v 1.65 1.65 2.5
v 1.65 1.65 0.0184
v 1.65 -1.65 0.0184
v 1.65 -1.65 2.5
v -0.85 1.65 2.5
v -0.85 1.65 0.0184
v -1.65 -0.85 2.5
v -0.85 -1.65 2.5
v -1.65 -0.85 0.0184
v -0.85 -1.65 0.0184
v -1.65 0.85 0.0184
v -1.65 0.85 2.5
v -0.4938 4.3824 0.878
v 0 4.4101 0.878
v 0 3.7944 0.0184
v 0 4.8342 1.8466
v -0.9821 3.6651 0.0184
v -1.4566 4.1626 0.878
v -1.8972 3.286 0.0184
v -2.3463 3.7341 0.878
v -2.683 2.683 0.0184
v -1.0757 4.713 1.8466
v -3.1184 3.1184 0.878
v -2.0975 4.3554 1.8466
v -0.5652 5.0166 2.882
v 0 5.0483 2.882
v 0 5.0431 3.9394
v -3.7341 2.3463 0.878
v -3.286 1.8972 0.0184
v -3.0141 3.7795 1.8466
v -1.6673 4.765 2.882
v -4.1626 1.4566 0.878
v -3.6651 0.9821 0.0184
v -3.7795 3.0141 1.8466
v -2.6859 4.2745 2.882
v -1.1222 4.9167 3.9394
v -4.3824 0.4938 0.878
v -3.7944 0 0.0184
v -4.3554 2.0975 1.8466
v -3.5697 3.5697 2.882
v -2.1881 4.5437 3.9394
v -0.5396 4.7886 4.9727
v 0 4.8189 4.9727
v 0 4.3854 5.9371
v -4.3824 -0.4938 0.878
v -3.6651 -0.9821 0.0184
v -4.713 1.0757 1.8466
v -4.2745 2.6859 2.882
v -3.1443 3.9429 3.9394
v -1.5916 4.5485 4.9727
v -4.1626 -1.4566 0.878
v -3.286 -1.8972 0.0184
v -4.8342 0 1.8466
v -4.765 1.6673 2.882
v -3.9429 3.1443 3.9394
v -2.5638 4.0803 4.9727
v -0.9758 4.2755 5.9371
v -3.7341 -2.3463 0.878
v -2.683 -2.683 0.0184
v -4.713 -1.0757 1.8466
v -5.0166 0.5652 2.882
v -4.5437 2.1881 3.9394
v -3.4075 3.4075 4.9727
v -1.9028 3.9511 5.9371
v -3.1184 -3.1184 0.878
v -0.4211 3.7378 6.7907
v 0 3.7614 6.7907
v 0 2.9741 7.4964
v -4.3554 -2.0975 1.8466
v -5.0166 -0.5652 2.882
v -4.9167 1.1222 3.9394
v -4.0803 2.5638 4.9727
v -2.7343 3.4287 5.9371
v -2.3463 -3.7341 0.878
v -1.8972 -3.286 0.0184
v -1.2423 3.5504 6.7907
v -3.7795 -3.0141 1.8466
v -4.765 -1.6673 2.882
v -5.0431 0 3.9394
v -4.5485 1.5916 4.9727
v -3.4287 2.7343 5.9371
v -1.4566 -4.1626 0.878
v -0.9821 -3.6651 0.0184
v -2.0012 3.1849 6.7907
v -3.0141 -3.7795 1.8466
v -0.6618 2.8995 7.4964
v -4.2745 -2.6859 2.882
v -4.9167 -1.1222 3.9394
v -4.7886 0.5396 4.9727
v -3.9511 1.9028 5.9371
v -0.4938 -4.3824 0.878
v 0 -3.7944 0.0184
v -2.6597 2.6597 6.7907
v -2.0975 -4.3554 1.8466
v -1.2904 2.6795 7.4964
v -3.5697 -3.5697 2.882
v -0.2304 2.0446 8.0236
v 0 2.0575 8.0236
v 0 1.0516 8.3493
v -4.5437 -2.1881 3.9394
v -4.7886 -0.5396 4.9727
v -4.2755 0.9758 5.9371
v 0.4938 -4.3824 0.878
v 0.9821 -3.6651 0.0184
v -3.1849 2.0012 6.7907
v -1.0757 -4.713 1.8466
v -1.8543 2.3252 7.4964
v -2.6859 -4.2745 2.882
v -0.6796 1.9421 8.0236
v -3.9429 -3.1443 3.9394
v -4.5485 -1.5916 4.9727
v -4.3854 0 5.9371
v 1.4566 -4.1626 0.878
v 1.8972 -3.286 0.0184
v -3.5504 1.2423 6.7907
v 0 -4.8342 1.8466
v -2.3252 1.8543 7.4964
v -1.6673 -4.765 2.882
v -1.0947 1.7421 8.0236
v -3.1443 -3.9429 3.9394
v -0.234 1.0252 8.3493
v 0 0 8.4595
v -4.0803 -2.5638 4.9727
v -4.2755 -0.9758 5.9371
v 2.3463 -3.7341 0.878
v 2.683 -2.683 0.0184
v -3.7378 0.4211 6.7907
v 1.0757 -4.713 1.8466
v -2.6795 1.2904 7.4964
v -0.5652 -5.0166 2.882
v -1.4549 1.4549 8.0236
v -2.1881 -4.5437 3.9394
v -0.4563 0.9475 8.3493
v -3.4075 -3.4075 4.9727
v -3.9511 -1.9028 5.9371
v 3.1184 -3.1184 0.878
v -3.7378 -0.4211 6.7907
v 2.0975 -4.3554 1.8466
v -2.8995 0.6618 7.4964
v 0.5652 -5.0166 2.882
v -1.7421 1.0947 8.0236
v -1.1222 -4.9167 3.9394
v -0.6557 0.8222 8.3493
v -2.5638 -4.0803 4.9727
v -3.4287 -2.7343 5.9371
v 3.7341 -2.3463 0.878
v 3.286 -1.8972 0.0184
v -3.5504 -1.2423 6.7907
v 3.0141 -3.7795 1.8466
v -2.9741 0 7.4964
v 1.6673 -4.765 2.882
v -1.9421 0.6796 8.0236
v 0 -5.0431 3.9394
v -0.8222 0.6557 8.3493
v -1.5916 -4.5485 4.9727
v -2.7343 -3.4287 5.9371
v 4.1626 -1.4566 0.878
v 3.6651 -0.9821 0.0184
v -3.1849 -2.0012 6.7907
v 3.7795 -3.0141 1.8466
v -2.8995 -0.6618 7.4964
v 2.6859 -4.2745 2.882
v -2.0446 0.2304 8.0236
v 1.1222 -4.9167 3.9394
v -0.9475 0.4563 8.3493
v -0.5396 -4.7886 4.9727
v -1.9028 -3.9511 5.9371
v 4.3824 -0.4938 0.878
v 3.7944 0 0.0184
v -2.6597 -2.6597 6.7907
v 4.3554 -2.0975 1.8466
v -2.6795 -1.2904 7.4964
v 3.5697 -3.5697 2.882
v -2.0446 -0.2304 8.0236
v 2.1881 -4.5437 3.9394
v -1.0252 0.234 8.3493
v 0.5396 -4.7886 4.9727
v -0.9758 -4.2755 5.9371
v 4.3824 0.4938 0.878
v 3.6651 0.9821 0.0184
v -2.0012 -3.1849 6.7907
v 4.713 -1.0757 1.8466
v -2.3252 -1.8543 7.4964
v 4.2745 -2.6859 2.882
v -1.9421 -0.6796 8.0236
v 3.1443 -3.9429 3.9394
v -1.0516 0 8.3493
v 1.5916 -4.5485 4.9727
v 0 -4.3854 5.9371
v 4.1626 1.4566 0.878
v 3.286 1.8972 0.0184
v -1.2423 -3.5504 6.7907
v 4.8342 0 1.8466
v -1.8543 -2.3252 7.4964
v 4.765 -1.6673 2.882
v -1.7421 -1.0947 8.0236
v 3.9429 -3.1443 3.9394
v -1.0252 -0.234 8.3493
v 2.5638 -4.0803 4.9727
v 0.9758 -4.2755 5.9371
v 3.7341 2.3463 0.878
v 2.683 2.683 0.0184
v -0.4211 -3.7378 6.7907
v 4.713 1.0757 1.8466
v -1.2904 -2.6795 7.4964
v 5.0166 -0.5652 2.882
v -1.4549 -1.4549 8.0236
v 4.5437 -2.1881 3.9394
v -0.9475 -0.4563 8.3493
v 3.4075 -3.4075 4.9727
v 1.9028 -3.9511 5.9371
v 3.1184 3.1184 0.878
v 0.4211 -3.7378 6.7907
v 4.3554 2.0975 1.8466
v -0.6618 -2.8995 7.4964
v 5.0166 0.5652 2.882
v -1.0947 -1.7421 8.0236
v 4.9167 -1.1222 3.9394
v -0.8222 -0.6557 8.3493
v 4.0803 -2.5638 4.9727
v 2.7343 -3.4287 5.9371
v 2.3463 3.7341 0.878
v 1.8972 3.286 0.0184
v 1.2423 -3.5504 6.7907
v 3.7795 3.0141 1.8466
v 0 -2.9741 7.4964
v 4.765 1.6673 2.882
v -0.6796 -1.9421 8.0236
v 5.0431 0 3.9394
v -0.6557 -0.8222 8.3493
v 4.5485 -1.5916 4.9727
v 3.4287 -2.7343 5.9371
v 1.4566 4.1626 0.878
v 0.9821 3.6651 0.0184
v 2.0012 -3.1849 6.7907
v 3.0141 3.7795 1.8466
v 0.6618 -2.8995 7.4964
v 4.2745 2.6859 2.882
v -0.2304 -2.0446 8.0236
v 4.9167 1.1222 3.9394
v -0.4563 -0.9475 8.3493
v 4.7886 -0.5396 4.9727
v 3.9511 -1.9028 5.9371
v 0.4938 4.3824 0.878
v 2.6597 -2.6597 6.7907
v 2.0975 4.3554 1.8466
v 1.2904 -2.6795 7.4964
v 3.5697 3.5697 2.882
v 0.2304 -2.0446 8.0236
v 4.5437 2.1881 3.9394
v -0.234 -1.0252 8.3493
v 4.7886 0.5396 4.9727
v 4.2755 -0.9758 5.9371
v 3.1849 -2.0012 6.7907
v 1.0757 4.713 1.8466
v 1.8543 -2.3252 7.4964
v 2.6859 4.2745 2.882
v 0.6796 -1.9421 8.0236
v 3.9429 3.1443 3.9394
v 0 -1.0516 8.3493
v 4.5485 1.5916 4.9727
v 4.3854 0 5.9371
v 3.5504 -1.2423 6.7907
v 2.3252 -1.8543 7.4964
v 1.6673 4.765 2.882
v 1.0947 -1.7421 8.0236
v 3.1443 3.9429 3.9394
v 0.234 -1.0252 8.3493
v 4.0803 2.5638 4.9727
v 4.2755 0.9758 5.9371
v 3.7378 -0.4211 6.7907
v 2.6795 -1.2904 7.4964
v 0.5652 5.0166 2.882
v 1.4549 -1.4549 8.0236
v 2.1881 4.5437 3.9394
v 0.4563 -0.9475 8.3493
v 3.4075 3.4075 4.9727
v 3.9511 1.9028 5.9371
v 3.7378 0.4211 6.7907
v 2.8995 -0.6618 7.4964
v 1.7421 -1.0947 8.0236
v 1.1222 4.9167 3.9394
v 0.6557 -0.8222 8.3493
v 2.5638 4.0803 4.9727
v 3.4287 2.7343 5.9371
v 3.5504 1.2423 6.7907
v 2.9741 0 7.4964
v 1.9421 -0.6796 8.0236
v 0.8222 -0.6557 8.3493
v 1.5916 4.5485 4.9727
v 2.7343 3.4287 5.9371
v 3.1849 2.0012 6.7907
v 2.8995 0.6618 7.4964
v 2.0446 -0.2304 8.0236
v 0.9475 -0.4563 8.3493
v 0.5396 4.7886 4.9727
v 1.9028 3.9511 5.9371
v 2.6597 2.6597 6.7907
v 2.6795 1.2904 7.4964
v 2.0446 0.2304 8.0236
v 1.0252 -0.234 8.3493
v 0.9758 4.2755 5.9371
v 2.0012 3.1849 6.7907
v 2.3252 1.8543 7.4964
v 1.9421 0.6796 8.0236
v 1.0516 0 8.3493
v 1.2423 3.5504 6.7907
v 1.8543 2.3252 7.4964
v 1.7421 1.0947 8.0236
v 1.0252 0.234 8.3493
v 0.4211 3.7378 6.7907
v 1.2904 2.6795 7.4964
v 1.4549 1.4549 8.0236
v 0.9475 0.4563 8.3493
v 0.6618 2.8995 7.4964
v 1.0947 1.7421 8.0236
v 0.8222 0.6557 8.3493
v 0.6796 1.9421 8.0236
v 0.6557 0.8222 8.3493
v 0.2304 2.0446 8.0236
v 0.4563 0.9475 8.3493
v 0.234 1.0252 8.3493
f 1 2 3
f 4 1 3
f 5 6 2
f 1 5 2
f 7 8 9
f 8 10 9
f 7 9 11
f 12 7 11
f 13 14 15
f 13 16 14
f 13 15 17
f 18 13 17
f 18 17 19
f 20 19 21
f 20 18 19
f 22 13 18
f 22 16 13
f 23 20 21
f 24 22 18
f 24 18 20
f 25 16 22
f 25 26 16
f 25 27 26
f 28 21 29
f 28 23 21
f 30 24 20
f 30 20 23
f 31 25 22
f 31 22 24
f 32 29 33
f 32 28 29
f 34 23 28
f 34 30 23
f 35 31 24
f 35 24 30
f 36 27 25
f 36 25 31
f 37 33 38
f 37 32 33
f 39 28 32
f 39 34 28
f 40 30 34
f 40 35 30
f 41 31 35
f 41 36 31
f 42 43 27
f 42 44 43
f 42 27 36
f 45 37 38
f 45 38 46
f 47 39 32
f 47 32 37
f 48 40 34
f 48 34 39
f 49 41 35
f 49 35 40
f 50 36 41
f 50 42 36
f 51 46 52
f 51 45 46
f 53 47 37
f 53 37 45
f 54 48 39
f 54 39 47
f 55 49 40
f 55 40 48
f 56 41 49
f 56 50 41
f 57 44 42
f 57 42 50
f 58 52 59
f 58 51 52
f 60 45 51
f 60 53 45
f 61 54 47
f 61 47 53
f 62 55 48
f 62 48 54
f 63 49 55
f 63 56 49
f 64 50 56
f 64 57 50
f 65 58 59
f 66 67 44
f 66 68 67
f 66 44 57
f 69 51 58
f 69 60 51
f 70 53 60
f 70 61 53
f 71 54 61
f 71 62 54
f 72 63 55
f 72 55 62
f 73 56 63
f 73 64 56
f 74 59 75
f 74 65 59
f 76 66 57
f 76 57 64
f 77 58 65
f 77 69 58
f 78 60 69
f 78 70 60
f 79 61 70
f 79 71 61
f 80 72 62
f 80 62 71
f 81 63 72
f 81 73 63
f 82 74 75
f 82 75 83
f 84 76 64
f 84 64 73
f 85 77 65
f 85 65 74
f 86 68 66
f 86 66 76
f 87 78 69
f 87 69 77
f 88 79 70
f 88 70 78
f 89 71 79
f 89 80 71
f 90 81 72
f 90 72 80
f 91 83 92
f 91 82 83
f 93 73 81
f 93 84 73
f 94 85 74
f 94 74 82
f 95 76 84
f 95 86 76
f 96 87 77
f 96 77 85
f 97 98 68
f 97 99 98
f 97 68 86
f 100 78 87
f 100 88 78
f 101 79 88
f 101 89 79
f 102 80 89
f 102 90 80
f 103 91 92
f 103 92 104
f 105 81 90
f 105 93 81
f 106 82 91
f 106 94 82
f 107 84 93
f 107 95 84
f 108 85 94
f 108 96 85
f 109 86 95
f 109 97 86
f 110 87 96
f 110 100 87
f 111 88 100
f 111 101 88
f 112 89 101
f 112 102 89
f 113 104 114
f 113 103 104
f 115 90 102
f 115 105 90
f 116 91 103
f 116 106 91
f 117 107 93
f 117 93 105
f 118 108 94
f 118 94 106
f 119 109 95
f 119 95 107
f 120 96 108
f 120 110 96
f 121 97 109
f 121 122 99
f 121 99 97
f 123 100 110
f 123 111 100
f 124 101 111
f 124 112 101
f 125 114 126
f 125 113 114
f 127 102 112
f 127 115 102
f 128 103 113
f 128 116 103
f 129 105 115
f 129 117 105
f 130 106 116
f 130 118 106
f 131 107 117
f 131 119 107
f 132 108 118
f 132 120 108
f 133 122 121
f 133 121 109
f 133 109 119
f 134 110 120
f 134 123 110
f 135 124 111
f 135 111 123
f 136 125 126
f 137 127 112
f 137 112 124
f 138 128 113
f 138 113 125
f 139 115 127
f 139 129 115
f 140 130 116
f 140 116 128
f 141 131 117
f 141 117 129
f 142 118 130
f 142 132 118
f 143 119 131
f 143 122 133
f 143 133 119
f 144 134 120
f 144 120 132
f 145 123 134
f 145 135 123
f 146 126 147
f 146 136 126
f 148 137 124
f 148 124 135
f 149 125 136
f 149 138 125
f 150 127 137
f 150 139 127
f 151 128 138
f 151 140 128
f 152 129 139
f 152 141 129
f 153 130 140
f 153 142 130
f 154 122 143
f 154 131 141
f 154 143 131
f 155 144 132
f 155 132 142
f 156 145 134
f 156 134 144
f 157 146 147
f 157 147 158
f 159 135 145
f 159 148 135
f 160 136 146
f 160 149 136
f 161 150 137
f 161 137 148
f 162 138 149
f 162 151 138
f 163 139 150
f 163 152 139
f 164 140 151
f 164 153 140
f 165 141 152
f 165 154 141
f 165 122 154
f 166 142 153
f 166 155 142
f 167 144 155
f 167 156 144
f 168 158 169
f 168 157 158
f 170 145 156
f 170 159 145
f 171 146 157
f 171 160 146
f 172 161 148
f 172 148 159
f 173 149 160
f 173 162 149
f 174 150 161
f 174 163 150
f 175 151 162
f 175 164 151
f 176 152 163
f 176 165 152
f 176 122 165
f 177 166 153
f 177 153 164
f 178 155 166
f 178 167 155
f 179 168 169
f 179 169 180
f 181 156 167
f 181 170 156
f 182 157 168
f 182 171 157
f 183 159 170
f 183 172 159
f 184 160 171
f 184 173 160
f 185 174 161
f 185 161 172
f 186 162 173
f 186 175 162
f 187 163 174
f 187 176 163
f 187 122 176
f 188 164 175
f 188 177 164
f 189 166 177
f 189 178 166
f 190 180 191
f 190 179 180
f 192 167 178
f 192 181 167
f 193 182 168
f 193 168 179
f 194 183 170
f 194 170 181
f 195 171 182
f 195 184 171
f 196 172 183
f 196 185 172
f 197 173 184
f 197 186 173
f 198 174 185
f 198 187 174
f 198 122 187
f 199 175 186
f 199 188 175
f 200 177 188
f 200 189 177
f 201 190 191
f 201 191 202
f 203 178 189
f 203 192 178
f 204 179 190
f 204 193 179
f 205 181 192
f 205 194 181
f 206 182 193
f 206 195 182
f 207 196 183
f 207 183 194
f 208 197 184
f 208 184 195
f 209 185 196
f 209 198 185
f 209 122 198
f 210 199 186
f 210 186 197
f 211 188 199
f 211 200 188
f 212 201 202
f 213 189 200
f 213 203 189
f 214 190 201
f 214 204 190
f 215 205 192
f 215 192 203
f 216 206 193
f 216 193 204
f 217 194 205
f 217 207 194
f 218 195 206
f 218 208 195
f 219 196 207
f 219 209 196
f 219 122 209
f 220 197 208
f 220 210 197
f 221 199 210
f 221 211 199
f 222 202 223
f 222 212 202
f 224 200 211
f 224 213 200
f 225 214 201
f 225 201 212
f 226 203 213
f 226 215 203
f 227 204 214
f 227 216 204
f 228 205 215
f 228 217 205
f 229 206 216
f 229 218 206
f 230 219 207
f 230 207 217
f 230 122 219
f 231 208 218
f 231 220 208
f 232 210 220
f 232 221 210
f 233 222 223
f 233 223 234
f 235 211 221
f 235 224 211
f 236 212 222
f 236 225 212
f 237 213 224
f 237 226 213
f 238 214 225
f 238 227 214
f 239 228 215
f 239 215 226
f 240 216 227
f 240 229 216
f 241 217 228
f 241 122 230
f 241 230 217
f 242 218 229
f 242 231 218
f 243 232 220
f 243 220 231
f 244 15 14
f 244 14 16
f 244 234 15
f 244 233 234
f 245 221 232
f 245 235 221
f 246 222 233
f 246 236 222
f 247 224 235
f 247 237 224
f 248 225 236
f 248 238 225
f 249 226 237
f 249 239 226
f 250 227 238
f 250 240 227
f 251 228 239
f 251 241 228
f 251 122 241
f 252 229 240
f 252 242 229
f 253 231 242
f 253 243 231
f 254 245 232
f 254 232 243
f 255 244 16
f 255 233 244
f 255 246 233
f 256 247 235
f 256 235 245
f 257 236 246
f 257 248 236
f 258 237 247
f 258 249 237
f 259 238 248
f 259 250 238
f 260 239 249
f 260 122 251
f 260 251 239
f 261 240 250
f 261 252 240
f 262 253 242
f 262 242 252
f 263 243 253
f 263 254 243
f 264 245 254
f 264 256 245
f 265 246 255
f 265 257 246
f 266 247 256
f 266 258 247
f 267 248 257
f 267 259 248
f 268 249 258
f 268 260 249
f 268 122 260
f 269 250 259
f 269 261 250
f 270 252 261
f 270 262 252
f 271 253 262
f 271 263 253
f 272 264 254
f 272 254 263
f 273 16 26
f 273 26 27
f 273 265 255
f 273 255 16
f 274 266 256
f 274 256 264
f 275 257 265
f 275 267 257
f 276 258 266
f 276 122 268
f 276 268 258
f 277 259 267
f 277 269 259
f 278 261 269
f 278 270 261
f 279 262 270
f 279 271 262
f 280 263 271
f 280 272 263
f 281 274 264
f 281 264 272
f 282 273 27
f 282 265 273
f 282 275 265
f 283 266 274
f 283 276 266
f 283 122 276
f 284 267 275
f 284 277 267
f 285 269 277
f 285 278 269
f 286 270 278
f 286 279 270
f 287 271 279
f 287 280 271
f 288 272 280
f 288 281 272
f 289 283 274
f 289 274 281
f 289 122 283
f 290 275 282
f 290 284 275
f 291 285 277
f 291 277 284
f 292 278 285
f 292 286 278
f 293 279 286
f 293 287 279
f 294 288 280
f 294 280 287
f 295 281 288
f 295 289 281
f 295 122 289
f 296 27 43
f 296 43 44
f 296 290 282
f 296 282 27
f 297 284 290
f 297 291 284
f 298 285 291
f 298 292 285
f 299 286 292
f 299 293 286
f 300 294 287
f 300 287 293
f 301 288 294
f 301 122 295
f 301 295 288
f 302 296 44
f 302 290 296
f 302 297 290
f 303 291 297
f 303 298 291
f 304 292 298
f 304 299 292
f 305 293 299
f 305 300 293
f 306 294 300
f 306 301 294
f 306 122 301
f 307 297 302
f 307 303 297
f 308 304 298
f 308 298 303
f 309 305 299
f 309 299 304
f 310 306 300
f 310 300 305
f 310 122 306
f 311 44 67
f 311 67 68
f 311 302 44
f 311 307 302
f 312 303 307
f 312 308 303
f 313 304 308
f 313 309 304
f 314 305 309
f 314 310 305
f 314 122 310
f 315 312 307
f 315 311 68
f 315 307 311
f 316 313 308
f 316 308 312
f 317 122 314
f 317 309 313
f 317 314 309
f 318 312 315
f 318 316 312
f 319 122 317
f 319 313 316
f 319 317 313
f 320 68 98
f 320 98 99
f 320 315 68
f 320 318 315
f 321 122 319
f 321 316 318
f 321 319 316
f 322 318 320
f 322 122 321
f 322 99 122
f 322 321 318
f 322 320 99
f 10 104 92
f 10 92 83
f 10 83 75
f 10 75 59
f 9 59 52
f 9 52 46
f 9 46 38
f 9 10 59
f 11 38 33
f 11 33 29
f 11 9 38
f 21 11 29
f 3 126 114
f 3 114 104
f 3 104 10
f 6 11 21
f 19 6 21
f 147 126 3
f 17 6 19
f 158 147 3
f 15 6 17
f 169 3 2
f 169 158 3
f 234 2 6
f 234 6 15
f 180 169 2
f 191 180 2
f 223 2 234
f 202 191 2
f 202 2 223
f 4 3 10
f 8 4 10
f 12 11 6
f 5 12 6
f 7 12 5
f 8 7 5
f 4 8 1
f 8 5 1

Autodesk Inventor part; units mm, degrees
ref_plane "Work Plane1" through (0, 0, 0) normal (1, 0, 0) x (0, 0, -1)
sketch "Sketch3" plane through (0, 0, 0) normal (1, 0, 0) x (0, 0, -1)
  circle A0 centre (-3.3861, 0) radius 5.0734
  line L0 (-8.4595, 0) -> (1.6873, 0)
  line L1 (-0.0184, 0) -> (-0.0184, 3.7944)
  point P0 (0, 0)
ref_plane "Work Plane2" through (-0.85, -1.65, 0) normal (0, 0, 1) x (1, 0, 0)
sketch "Sketch5" plane through (-0.85, -1.65, 0) normal (0, 0, 1) x (1, 0, 0)
  line L0 (-0.8, 2.5) -> (0, 3.3) projected
  line L1 (-0.8, 0.8) -> (-0.8, 2.5) projected
  line L2 (0, 0) -> (-0.8, 0.8) projected
  line L3 (2.5, 0) -> (0, 0) projected
  line L4 (2.5, 3.3) -> (2.5, 0) projected
  line L5 (0, 3.3) -> (2.5, 3.3) projected
  circle A0 centre (0.85, 1.65) radius 1.25 projected
revolve "Revolution2" add sketch "Sketch3" angle 360 about axis through (0, 0, 8.4595) along (0, 0, -1) picked at (-5.6014, 0.385) contours L1 L0 A0
ref_plane "Work Plane3" through (-0.85, -1.65, 0) normal (0, 0, 1) x (1, 0, 0)
sketch "Sketch6" plane through (-0.85, -1.65, 0) normal (0, 0, 1) x (1, 0, 0)
  line L0 (0.85, 8.4832) -> (0.85, -5.1832) projected
  line L1 (-0.8, 2.5) -> (0, 3.3) projected
  line L2 (-0.8, 0.8) -> (-0.8, 2.5) projected
  line L3 (0, 0) -> (-0.8, 0.8) projected
  line L4 (2.5, 0) -> (0, 0) projected
  line L5 (2.5, 3.3) -> (2.5, 0) projected
  line L6 (0, 3.3) -> (2.5, 3.3) projected
  circle A0 centre (0.85, 1.65) radius 1.25 projected
  circle A1 centre (0.85, 1.65) radius 1.25 projected
extrude "Extrusion2" cut sketch "Sketch6" along normal blind 2.5
properties part number "JS5210_hat_top_1"
